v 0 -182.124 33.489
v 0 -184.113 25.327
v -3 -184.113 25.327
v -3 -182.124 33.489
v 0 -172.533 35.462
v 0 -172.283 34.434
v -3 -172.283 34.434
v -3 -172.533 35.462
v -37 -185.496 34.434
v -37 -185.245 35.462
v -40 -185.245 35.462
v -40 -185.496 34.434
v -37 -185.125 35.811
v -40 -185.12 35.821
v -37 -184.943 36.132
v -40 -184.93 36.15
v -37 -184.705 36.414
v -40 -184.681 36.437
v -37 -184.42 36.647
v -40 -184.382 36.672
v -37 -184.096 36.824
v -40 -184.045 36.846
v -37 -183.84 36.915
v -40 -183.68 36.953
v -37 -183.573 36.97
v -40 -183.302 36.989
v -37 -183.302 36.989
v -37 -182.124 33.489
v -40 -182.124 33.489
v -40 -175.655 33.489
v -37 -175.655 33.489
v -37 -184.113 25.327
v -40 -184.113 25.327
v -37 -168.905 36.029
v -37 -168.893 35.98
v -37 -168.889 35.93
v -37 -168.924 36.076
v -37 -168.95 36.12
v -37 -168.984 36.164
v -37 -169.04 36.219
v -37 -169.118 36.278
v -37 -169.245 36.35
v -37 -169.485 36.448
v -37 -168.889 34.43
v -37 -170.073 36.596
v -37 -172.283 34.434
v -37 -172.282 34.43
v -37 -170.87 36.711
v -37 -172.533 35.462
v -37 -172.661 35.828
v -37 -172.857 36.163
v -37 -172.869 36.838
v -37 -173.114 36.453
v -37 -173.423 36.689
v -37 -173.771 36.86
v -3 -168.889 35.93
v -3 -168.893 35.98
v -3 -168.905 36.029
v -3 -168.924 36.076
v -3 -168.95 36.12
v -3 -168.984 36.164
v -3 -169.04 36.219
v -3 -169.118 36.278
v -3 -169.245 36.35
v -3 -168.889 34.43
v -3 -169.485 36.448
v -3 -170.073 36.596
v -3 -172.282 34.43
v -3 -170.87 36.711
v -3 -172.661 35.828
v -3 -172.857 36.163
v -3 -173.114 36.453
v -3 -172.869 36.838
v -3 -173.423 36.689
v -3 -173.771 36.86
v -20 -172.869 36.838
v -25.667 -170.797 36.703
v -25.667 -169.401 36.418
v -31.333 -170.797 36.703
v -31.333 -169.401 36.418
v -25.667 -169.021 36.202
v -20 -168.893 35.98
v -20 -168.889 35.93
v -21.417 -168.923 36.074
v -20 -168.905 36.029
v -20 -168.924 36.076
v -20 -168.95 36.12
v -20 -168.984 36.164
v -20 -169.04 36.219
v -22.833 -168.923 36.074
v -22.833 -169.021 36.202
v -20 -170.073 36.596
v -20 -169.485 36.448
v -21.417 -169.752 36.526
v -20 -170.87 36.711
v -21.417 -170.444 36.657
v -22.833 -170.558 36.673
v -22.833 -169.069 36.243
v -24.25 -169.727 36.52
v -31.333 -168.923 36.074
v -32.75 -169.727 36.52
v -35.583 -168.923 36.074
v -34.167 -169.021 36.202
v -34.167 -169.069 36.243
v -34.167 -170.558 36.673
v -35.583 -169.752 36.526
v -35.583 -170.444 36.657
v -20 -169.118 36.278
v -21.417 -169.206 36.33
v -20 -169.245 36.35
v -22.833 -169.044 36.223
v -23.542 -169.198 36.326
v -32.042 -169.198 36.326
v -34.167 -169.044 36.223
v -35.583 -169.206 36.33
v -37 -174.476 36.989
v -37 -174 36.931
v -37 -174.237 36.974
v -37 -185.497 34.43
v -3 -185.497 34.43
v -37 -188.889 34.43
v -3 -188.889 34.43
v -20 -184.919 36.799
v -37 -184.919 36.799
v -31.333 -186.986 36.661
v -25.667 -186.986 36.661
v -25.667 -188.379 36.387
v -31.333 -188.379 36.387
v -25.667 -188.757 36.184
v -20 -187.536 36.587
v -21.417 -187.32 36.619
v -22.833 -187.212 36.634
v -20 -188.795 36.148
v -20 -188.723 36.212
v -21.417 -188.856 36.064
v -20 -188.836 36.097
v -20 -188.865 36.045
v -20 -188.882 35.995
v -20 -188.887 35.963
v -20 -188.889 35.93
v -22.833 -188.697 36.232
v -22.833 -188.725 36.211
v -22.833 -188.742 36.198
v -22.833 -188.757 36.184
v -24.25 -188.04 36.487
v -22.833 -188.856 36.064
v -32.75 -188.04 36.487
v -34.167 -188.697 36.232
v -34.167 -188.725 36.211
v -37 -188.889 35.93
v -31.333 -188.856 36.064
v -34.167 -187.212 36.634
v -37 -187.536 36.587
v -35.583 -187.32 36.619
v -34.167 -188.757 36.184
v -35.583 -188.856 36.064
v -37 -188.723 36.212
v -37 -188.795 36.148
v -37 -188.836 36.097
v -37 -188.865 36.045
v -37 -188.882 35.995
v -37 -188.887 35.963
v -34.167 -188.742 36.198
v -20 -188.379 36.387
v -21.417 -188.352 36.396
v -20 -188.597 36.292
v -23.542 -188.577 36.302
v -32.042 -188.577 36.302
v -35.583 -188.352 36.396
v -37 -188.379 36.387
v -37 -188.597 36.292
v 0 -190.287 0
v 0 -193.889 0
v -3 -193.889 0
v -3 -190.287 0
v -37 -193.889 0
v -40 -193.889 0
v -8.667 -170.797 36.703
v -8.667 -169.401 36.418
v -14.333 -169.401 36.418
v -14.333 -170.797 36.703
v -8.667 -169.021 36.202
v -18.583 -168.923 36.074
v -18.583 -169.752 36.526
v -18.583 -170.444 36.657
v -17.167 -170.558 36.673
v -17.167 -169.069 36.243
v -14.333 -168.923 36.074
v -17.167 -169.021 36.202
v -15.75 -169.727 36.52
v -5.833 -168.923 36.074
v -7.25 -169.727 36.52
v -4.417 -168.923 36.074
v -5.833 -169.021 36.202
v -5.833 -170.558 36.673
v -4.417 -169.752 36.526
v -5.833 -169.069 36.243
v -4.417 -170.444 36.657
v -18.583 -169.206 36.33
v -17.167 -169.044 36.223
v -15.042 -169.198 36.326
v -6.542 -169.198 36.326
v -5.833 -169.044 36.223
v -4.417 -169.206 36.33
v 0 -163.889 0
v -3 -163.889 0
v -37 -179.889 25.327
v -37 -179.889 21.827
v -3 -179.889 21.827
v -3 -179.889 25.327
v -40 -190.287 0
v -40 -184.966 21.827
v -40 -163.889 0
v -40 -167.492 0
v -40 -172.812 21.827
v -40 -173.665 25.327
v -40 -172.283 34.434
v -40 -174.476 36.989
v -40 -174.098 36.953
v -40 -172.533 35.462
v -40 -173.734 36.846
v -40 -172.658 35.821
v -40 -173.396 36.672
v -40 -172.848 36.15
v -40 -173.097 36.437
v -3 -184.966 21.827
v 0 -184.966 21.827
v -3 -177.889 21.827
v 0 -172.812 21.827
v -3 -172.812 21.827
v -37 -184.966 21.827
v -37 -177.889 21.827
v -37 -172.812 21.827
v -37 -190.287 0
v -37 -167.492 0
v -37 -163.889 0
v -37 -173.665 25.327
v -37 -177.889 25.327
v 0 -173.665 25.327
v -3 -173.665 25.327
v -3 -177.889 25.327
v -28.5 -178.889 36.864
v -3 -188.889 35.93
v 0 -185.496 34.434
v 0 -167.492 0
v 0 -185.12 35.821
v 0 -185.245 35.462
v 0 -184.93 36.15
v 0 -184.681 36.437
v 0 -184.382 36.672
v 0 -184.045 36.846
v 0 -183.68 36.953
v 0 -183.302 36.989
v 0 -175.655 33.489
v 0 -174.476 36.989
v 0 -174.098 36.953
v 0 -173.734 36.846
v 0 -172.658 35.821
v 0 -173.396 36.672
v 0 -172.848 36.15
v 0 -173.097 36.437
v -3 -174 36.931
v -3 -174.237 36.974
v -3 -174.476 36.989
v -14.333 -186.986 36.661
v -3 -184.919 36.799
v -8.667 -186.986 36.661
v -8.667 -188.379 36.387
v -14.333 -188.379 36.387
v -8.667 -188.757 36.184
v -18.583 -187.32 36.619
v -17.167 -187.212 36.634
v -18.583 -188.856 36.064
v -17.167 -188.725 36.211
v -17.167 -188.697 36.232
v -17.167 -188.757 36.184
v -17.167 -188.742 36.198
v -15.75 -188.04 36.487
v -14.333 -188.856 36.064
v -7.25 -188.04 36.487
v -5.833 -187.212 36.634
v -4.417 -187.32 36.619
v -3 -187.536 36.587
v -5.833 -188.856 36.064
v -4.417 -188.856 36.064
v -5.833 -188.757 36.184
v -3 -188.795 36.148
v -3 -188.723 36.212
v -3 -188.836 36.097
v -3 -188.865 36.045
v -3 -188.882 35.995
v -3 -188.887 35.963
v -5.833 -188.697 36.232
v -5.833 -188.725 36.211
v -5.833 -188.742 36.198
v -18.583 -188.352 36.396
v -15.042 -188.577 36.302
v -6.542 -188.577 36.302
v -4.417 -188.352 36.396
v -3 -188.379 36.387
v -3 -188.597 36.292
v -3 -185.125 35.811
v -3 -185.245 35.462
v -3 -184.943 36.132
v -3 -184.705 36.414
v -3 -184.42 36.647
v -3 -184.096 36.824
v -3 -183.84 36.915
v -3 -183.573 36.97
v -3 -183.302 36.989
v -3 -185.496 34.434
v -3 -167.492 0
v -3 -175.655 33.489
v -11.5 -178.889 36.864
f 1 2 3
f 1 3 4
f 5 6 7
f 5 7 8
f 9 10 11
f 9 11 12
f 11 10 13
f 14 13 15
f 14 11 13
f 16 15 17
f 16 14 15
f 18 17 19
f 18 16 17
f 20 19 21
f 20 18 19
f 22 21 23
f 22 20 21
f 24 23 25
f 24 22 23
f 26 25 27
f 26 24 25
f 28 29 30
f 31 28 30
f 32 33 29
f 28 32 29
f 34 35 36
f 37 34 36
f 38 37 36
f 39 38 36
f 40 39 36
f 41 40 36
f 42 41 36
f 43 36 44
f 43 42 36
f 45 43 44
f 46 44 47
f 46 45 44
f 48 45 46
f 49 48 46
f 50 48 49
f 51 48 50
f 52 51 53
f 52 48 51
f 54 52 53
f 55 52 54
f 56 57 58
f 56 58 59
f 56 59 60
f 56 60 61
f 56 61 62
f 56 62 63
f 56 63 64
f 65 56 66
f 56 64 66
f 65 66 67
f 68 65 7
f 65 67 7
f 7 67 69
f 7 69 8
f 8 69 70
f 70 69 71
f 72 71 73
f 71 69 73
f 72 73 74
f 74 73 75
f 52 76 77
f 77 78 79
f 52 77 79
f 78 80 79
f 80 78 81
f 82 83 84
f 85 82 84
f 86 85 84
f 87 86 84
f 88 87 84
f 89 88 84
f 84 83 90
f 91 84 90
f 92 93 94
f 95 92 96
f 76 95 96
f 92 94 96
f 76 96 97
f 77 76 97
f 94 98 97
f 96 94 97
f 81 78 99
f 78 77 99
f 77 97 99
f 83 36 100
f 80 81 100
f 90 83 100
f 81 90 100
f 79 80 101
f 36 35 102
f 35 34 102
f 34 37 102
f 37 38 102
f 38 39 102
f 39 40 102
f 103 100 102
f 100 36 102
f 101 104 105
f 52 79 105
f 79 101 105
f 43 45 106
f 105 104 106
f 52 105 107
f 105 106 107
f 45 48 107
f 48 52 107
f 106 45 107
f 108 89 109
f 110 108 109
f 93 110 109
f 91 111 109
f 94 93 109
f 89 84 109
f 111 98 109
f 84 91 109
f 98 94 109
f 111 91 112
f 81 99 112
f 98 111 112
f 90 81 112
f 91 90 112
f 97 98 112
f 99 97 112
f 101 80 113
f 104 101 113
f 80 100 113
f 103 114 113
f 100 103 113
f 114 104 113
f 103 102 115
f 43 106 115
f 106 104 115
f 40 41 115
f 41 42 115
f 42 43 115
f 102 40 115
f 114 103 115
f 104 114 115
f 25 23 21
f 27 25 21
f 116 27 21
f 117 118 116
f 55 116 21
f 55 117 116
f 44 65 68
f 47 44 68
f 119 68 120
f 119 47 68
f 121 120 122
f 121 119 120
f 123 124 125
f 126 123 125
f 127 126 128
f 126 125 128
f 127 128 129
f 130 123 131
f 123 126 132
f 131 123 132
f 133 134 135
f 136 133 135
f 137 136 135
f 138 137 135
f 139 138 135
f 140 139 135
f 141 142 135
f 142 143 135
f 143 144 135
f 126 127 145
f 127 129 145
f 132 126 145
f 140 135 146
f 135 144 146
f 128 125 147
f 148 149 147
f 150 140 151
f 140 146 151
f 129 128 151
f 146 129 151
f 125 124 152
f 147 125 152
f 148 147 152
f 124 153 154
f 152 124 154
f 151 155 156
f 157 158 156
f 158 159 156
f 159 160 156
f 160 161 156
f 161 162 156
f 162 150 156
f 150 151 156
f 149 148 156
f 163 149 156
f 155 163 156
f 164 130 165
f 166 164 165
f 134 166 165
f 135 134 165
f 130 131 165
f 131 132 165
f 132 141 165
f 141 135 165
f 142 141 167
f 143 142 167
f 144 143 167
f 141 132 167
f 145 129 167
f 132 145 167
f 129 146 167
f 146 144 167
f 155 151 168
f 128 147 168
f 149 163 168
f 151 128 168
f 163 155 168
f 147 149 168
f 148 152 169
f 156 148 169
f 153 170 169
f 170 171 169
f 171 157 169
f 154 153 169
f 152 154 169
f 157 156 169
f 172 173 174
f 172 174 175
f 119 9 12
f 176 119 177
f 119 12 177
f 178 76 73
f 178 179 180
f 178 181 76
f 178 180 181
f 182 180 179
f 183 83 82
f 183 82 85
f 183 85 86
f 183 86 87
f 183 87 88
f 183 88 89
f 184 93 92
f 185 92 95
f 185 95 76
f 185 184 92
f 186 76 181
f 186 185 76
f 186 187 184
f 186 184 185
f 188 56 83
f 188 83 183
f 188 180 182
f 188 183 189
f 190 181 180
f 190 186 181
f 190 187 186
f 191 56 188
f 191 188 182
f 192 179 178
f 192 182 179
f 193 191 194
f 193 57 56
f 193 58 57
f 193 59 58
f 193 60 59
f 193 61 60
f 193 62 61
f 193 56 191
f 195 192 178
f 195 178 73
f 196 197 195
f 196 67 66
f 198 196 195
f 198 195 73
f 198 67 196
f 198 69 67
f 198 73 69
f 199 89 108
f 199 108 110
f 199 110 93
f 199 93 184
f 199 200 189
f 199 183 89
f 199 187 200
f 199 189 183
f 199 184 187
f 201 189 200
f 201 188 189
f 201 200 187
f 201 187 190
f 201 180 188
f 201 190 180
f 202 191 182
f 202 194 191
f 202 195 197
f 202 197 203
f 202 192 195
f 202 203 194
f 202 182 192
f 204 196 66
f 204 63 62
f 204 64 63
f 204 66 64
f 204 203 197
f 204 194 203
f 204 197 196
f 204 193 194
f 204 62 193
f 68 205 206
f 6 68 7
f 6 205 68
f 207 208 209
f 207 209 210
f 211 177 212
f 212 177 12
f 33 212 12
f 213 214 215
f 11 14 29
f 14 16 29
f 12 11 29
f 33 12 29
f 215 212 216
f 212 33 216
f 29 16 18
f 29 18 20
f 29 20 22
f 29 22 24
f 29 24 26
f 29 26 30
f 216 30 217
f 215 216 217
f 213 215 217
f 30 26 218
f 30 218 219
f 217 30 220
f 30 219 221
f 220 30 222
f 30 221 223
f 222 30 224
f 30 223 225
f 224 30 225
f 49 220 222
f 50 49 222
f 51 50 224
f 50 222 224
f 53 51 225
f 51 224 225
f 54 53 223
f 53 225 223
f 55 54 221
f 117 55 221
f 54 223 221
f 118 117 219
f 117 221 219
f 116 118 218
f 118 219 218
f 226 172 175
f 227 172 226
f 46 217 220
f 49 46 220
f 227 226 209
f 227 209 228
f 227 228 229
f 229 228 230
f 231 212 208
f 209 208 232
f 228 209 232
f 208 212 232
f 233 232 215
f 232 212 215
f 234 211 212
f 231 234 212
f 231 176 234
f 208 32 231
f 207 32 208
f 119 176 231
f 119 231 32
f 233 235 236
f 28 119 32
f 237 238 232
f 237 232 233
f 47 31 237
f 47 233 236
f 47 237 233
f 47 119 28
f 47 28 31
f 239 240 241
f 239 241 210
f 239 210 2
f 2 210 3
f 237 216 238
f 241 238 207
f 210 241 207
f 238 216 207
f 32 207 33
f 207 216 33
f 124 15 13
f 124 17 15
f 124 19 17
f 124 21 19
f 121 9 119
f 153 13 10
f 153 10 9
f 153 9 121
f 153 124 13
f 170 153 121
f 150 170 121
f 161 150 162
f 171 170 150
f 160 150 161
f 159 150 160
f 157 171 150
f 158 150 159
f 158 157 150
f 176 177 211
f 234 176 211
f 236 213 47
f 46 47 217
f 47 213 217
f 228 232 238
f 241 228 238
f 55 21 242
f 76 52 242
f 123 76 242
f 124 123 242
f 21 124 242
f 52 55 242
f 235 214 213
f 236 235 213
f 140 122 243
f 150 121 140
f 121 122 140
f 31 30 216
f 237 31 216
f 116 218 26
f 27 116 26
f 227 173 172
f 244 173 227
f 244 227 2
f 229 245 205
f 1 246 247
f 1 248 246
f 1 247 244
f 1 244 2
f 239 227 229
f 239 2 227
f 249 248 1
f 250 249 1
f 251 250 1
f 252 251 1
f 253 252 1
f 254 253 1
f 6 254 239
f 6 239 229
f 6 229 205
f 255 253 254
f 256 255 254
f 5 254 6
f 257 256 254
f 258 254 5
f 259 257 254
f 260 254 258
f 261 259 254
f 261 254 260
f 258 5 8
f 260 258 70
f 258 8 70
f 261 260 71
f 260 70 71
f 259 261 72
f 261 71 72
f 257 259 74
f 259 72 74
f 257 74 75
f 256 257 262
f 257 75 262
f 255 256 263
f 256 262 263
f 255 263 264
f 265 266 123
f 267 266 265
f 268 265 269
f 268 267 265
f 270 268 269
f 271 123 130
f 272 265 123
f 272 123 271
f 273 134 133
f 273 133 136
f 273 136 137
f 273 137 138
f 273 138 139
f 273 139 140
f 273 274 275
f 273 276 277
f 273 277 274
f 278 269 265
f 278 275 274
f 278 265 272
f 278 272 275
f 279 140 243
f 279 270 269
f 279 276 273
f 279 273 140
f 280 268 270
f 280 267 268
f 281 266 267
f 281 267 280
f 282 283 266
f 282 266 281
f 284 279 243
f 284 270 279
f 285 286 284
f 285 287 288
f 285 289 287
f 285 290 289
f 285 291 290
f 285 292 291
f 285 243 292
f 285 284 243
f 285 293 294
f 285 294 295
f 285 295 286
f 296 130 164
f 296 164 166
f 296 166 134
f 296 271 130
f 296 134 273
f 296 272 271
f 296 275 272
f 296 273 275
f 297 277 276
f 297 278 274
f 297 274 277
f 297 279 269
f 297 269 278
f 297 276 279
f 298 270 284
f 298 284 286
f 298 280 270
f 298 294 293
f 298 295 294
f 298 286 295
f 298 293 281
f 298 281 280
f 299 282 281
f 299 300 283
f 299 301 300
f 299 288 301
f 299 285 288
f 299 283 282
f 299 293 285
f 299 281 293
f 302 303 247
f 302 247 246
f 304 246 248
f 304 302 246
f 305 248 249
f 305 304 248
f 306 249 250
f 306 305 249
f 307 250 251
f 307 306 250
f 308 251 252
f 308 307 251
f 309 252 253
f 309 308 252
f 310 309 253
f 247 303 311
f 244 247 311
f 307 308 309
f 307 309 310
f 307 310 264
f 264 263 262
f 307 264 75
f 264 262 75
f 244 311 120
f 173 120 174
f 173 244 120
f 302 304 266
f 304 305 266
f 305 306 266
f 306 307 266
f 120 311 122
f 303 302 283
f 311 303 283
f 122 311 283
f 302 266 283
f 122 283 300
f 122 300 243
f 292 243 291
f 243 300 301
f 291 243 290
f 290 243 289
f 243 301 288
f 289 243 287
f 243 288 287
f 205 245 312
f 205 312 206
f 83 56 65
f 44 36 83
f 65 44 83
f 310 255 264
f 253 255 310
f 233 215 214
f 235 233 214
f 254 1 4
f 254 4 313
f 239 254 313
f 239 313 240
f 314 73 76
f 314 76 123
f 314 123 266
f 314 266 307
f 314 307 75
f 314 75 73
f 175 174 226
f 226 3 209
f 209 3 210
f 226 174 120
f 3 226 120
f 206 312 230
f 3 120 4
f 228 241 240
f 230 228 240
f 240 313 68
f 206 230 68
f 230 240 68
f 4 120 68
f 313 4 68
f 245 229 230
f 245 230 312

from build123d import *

# Parameters (mm, degrees)
F0_W        = 1
F0_H        = 3.5
F1_DEPTH    = 3
F2_DEPTH    = 20
F4_DEPTH    = 17
F6_T1_DEPTH = 6.9276237231
F6_T3_DEPTH = 6.9276237231


# Not quite as in the source:
# - a fillet or chamfer that OpenCascade refuses, or shapes differently, is made with other operations: its cross-section is extruded or revolved along the edge and cut away or added


with BuildPart() as f1:
    # F0 (on Right) → F1 (new body)
    with BuildSketch(Plane.YZ):
        Polygon((-185.4956659779, 34.4343371689), (-193.88920142, 0), (-190.2867229659, 0), (-184.9662980764, 21.8269531103), (-184.1131562284, 25.3269531103), (-182.1236807397, 33.4887426496), (-178.88920142, 33.4887426496), (-175.6547221004, 33.4887426496), (-173.6652466117, 25.3269531103), (-172.8121047636, 21.8269531103), (-167.4916798742, 0), (-163.88920142, 0), (-172.2827368621, 34.4343371689), (-178.88920142, 34.4343371689), align=None)
        Polygon((-184.8730173458, 36.9887426496), (-185.4956659779, 34.4343371689), (-178.88920142, 34.4343371689), (-172.2827368621, 34.4343371689), (-172.9053854942, 36.9887426496), (-178.88920142, 36.9887426496), align=None)
        Polygon((-184.1131562284, 25.3269531103), (-184.9662980764, 21.8269531103), (-179.88920142, 21.8269531103), (-179.88920142, 25.3269531103), align=None)
        with Locations((-178.38920142, 23.5769531103)):
            Rectangle(F0_W, F0_H)
        with Locations((-179.38920142, 23.5769531103)):
            Rectangle(F0_W, F0_H)
        Polygon((-177.88920142, 21.8269531103), (-172.8121047636, 21.8269531103), (-173.6652466117, 25.3269531103), (-177.88920142, 25.3269531103), align=None)
    extrude(amount=-F1_DEPTH)

    # F0 (on Right) → F2 (join)
    with BuildSketch(Plane.YZ):
        with Locations((-179.38920142, 23.5769531103)):
            Rectangle(F0_W, F0_H)
        with Locations((-178.38920142, 23.5769531103)):
            Rectangle(F0_W, F0_H)
    extrude(amount=-F2_DEPTH)

    # F3 (on face) → F4 (join, through all)
    with BuildSketch(Plane(origin=(-3, 0, 0), x_dir=(0, -1, 0), z_dir=(-1, 0, 0))):
        with BuildLine():
            Line((168.88920142, 34.4301523733), (172.2817167981, 34.4301523733))
            Line((172.2817167981, 34.4301523733), (172.8685340256, 36.8375601227))
            add(Edge.make_bspline(
                [(168.88920142, 35.9301523733), (168.88920142, 36.5362981599), (170.5285389627, 36.7602466997), (172.8685340256, 36.8375601227)],
                knots=[0, 0, 0, 0, 0.2862985804, 0.2862985804, 0.2862985804, 0.2862985804], degree=3))
            Line((168.88920142, 35.9301523733), (168.88920142, 34.4301523733))
        make_face()
        with BuildLine():
            Line((184.9191853663, 36.7993391266), (185.496686042, 34.4301523733))
            Line((185.496686042, 34.4301523733), (188.88920142, 34.4301523733))
            Line((188.88920142, 34.4301523733), (188.88920142, 35.9301523733))
            add(Edge.make_bspline(
                [(184.9191853663, 36.7993391266), (187.2542140028, 36.7124384565), (188.88920142, 36.4941599471), (188.88920142, 35.9301523733)],
                knots=[0.7140815311, 0.7140815311, 0.7140815311, 0.7140815311, 1, 1, 1, 1], degree=3))
        make_face()
        with BuildLine():
            Line((172.2817167981, 34.4301523733), (178.88920142, 34.4301523733))
            Line((178.88920142, 34.4301523733), (185.496686042, 34.4301523733))
            Line((185.496686042, 34.4301523733), (184.9191853663, 36.7993391266))
            add(Edge.make_bspline(
                [(172.8685340256, 36.8375601227), (174.6151730279, 36.895269065), (178.8930025349, 36.8472471546), (183.1708320419, 36.8644060269), (184.9191853663, 36.7993391266)],
                knots=[0.2862985804, 0.2862985804, 0.2862985804, 0.2862985804, 0.5, 0.7140815311, 0.7140815311, 0.7140815311, 0.7140815311], degree=3))
            Line((172.8685340256, 36.8375601227), (172.2817167981, 34.4301523733))
        make_face()
    extrude(amount=F4_DEPTH)

    # F5: F1 across face


with BuildPart() as f1_1:
    add(f1.part)
    add(f1.part.mirror(Plane(origin=(-20, -178.8538492179, 35.6039729667), x_dir=(0, -1, 0), z_dir=(-1, 0, 0))))

    # F6: fillet of radius 2 on 4 edges, made by hand

    # F6_s2 → F6_t1 (cut)
    with BuildSketch(Plane.YZ.offset(-3)):
        with BuildLine():
            ThreePointArc((-185.2450745508, 35.4623842598), (-184.5374266336, 36.561524138), (-183.3019678566, 36.9887426496))
            Line((-183.3019678566, 36.9887426496), (-184.8730173458, 36.9887426496))
            Line((-184.8730173458, 36.9887426496), (-185.2450745508, 35.4623842598))
        make_face()
        with BuildLine():
            ThreePointArc((-172.5333282893, 35.4623842598), (-173.2409762064, 36.561524138), (-174.4764349835, 36.9887426496))
            Line((-174.4764349835, 36.9887426496), (-172.9053854942, 36.9887426496))
            Line((-172.9053854942, 36.9887426496), (-172.5333282893, 35.4623842598))
        make_face()
    extrude(amount=F6_T1_DEPTH, mode=Mode.SUBTRACT)

    # F6_s4 → F6_t3 (cut)
    with BuildSketch(Plane.YZ.offset(-43.9276237231)):
        with BuildLine():
            ThreePointArc((-185.2450745508, 35.4623842598), (-184.5374266336, 36.561524138), (-183.3019678566, 36.9887426496))
            Line((-183.3019678566, 36.9887426496), (-184.8730173458, 36.9887426496))
            Line((-184.8730173458, 36.9887426496), (-185.2450745508, 35.4623842598))
        make_face()
        with BuildLine():
            ThreePointArc((-172.5333282893, 35.4623842598), (-173.2409762064, 36.561524138), (-174.4764349835, 36.9887426496))
            Line((-174.4764349835, 36.9887426496), (-172.9053854942, 36.9887426496))
            Line((-172.9053854942, 36.9887426496), (-172.5333282893, 35.4623842598))
        make_face()
    extrude(amount=F6_T3_DEPTH, mode=Mode.SUBTRACT)


solid = f1_1.part
